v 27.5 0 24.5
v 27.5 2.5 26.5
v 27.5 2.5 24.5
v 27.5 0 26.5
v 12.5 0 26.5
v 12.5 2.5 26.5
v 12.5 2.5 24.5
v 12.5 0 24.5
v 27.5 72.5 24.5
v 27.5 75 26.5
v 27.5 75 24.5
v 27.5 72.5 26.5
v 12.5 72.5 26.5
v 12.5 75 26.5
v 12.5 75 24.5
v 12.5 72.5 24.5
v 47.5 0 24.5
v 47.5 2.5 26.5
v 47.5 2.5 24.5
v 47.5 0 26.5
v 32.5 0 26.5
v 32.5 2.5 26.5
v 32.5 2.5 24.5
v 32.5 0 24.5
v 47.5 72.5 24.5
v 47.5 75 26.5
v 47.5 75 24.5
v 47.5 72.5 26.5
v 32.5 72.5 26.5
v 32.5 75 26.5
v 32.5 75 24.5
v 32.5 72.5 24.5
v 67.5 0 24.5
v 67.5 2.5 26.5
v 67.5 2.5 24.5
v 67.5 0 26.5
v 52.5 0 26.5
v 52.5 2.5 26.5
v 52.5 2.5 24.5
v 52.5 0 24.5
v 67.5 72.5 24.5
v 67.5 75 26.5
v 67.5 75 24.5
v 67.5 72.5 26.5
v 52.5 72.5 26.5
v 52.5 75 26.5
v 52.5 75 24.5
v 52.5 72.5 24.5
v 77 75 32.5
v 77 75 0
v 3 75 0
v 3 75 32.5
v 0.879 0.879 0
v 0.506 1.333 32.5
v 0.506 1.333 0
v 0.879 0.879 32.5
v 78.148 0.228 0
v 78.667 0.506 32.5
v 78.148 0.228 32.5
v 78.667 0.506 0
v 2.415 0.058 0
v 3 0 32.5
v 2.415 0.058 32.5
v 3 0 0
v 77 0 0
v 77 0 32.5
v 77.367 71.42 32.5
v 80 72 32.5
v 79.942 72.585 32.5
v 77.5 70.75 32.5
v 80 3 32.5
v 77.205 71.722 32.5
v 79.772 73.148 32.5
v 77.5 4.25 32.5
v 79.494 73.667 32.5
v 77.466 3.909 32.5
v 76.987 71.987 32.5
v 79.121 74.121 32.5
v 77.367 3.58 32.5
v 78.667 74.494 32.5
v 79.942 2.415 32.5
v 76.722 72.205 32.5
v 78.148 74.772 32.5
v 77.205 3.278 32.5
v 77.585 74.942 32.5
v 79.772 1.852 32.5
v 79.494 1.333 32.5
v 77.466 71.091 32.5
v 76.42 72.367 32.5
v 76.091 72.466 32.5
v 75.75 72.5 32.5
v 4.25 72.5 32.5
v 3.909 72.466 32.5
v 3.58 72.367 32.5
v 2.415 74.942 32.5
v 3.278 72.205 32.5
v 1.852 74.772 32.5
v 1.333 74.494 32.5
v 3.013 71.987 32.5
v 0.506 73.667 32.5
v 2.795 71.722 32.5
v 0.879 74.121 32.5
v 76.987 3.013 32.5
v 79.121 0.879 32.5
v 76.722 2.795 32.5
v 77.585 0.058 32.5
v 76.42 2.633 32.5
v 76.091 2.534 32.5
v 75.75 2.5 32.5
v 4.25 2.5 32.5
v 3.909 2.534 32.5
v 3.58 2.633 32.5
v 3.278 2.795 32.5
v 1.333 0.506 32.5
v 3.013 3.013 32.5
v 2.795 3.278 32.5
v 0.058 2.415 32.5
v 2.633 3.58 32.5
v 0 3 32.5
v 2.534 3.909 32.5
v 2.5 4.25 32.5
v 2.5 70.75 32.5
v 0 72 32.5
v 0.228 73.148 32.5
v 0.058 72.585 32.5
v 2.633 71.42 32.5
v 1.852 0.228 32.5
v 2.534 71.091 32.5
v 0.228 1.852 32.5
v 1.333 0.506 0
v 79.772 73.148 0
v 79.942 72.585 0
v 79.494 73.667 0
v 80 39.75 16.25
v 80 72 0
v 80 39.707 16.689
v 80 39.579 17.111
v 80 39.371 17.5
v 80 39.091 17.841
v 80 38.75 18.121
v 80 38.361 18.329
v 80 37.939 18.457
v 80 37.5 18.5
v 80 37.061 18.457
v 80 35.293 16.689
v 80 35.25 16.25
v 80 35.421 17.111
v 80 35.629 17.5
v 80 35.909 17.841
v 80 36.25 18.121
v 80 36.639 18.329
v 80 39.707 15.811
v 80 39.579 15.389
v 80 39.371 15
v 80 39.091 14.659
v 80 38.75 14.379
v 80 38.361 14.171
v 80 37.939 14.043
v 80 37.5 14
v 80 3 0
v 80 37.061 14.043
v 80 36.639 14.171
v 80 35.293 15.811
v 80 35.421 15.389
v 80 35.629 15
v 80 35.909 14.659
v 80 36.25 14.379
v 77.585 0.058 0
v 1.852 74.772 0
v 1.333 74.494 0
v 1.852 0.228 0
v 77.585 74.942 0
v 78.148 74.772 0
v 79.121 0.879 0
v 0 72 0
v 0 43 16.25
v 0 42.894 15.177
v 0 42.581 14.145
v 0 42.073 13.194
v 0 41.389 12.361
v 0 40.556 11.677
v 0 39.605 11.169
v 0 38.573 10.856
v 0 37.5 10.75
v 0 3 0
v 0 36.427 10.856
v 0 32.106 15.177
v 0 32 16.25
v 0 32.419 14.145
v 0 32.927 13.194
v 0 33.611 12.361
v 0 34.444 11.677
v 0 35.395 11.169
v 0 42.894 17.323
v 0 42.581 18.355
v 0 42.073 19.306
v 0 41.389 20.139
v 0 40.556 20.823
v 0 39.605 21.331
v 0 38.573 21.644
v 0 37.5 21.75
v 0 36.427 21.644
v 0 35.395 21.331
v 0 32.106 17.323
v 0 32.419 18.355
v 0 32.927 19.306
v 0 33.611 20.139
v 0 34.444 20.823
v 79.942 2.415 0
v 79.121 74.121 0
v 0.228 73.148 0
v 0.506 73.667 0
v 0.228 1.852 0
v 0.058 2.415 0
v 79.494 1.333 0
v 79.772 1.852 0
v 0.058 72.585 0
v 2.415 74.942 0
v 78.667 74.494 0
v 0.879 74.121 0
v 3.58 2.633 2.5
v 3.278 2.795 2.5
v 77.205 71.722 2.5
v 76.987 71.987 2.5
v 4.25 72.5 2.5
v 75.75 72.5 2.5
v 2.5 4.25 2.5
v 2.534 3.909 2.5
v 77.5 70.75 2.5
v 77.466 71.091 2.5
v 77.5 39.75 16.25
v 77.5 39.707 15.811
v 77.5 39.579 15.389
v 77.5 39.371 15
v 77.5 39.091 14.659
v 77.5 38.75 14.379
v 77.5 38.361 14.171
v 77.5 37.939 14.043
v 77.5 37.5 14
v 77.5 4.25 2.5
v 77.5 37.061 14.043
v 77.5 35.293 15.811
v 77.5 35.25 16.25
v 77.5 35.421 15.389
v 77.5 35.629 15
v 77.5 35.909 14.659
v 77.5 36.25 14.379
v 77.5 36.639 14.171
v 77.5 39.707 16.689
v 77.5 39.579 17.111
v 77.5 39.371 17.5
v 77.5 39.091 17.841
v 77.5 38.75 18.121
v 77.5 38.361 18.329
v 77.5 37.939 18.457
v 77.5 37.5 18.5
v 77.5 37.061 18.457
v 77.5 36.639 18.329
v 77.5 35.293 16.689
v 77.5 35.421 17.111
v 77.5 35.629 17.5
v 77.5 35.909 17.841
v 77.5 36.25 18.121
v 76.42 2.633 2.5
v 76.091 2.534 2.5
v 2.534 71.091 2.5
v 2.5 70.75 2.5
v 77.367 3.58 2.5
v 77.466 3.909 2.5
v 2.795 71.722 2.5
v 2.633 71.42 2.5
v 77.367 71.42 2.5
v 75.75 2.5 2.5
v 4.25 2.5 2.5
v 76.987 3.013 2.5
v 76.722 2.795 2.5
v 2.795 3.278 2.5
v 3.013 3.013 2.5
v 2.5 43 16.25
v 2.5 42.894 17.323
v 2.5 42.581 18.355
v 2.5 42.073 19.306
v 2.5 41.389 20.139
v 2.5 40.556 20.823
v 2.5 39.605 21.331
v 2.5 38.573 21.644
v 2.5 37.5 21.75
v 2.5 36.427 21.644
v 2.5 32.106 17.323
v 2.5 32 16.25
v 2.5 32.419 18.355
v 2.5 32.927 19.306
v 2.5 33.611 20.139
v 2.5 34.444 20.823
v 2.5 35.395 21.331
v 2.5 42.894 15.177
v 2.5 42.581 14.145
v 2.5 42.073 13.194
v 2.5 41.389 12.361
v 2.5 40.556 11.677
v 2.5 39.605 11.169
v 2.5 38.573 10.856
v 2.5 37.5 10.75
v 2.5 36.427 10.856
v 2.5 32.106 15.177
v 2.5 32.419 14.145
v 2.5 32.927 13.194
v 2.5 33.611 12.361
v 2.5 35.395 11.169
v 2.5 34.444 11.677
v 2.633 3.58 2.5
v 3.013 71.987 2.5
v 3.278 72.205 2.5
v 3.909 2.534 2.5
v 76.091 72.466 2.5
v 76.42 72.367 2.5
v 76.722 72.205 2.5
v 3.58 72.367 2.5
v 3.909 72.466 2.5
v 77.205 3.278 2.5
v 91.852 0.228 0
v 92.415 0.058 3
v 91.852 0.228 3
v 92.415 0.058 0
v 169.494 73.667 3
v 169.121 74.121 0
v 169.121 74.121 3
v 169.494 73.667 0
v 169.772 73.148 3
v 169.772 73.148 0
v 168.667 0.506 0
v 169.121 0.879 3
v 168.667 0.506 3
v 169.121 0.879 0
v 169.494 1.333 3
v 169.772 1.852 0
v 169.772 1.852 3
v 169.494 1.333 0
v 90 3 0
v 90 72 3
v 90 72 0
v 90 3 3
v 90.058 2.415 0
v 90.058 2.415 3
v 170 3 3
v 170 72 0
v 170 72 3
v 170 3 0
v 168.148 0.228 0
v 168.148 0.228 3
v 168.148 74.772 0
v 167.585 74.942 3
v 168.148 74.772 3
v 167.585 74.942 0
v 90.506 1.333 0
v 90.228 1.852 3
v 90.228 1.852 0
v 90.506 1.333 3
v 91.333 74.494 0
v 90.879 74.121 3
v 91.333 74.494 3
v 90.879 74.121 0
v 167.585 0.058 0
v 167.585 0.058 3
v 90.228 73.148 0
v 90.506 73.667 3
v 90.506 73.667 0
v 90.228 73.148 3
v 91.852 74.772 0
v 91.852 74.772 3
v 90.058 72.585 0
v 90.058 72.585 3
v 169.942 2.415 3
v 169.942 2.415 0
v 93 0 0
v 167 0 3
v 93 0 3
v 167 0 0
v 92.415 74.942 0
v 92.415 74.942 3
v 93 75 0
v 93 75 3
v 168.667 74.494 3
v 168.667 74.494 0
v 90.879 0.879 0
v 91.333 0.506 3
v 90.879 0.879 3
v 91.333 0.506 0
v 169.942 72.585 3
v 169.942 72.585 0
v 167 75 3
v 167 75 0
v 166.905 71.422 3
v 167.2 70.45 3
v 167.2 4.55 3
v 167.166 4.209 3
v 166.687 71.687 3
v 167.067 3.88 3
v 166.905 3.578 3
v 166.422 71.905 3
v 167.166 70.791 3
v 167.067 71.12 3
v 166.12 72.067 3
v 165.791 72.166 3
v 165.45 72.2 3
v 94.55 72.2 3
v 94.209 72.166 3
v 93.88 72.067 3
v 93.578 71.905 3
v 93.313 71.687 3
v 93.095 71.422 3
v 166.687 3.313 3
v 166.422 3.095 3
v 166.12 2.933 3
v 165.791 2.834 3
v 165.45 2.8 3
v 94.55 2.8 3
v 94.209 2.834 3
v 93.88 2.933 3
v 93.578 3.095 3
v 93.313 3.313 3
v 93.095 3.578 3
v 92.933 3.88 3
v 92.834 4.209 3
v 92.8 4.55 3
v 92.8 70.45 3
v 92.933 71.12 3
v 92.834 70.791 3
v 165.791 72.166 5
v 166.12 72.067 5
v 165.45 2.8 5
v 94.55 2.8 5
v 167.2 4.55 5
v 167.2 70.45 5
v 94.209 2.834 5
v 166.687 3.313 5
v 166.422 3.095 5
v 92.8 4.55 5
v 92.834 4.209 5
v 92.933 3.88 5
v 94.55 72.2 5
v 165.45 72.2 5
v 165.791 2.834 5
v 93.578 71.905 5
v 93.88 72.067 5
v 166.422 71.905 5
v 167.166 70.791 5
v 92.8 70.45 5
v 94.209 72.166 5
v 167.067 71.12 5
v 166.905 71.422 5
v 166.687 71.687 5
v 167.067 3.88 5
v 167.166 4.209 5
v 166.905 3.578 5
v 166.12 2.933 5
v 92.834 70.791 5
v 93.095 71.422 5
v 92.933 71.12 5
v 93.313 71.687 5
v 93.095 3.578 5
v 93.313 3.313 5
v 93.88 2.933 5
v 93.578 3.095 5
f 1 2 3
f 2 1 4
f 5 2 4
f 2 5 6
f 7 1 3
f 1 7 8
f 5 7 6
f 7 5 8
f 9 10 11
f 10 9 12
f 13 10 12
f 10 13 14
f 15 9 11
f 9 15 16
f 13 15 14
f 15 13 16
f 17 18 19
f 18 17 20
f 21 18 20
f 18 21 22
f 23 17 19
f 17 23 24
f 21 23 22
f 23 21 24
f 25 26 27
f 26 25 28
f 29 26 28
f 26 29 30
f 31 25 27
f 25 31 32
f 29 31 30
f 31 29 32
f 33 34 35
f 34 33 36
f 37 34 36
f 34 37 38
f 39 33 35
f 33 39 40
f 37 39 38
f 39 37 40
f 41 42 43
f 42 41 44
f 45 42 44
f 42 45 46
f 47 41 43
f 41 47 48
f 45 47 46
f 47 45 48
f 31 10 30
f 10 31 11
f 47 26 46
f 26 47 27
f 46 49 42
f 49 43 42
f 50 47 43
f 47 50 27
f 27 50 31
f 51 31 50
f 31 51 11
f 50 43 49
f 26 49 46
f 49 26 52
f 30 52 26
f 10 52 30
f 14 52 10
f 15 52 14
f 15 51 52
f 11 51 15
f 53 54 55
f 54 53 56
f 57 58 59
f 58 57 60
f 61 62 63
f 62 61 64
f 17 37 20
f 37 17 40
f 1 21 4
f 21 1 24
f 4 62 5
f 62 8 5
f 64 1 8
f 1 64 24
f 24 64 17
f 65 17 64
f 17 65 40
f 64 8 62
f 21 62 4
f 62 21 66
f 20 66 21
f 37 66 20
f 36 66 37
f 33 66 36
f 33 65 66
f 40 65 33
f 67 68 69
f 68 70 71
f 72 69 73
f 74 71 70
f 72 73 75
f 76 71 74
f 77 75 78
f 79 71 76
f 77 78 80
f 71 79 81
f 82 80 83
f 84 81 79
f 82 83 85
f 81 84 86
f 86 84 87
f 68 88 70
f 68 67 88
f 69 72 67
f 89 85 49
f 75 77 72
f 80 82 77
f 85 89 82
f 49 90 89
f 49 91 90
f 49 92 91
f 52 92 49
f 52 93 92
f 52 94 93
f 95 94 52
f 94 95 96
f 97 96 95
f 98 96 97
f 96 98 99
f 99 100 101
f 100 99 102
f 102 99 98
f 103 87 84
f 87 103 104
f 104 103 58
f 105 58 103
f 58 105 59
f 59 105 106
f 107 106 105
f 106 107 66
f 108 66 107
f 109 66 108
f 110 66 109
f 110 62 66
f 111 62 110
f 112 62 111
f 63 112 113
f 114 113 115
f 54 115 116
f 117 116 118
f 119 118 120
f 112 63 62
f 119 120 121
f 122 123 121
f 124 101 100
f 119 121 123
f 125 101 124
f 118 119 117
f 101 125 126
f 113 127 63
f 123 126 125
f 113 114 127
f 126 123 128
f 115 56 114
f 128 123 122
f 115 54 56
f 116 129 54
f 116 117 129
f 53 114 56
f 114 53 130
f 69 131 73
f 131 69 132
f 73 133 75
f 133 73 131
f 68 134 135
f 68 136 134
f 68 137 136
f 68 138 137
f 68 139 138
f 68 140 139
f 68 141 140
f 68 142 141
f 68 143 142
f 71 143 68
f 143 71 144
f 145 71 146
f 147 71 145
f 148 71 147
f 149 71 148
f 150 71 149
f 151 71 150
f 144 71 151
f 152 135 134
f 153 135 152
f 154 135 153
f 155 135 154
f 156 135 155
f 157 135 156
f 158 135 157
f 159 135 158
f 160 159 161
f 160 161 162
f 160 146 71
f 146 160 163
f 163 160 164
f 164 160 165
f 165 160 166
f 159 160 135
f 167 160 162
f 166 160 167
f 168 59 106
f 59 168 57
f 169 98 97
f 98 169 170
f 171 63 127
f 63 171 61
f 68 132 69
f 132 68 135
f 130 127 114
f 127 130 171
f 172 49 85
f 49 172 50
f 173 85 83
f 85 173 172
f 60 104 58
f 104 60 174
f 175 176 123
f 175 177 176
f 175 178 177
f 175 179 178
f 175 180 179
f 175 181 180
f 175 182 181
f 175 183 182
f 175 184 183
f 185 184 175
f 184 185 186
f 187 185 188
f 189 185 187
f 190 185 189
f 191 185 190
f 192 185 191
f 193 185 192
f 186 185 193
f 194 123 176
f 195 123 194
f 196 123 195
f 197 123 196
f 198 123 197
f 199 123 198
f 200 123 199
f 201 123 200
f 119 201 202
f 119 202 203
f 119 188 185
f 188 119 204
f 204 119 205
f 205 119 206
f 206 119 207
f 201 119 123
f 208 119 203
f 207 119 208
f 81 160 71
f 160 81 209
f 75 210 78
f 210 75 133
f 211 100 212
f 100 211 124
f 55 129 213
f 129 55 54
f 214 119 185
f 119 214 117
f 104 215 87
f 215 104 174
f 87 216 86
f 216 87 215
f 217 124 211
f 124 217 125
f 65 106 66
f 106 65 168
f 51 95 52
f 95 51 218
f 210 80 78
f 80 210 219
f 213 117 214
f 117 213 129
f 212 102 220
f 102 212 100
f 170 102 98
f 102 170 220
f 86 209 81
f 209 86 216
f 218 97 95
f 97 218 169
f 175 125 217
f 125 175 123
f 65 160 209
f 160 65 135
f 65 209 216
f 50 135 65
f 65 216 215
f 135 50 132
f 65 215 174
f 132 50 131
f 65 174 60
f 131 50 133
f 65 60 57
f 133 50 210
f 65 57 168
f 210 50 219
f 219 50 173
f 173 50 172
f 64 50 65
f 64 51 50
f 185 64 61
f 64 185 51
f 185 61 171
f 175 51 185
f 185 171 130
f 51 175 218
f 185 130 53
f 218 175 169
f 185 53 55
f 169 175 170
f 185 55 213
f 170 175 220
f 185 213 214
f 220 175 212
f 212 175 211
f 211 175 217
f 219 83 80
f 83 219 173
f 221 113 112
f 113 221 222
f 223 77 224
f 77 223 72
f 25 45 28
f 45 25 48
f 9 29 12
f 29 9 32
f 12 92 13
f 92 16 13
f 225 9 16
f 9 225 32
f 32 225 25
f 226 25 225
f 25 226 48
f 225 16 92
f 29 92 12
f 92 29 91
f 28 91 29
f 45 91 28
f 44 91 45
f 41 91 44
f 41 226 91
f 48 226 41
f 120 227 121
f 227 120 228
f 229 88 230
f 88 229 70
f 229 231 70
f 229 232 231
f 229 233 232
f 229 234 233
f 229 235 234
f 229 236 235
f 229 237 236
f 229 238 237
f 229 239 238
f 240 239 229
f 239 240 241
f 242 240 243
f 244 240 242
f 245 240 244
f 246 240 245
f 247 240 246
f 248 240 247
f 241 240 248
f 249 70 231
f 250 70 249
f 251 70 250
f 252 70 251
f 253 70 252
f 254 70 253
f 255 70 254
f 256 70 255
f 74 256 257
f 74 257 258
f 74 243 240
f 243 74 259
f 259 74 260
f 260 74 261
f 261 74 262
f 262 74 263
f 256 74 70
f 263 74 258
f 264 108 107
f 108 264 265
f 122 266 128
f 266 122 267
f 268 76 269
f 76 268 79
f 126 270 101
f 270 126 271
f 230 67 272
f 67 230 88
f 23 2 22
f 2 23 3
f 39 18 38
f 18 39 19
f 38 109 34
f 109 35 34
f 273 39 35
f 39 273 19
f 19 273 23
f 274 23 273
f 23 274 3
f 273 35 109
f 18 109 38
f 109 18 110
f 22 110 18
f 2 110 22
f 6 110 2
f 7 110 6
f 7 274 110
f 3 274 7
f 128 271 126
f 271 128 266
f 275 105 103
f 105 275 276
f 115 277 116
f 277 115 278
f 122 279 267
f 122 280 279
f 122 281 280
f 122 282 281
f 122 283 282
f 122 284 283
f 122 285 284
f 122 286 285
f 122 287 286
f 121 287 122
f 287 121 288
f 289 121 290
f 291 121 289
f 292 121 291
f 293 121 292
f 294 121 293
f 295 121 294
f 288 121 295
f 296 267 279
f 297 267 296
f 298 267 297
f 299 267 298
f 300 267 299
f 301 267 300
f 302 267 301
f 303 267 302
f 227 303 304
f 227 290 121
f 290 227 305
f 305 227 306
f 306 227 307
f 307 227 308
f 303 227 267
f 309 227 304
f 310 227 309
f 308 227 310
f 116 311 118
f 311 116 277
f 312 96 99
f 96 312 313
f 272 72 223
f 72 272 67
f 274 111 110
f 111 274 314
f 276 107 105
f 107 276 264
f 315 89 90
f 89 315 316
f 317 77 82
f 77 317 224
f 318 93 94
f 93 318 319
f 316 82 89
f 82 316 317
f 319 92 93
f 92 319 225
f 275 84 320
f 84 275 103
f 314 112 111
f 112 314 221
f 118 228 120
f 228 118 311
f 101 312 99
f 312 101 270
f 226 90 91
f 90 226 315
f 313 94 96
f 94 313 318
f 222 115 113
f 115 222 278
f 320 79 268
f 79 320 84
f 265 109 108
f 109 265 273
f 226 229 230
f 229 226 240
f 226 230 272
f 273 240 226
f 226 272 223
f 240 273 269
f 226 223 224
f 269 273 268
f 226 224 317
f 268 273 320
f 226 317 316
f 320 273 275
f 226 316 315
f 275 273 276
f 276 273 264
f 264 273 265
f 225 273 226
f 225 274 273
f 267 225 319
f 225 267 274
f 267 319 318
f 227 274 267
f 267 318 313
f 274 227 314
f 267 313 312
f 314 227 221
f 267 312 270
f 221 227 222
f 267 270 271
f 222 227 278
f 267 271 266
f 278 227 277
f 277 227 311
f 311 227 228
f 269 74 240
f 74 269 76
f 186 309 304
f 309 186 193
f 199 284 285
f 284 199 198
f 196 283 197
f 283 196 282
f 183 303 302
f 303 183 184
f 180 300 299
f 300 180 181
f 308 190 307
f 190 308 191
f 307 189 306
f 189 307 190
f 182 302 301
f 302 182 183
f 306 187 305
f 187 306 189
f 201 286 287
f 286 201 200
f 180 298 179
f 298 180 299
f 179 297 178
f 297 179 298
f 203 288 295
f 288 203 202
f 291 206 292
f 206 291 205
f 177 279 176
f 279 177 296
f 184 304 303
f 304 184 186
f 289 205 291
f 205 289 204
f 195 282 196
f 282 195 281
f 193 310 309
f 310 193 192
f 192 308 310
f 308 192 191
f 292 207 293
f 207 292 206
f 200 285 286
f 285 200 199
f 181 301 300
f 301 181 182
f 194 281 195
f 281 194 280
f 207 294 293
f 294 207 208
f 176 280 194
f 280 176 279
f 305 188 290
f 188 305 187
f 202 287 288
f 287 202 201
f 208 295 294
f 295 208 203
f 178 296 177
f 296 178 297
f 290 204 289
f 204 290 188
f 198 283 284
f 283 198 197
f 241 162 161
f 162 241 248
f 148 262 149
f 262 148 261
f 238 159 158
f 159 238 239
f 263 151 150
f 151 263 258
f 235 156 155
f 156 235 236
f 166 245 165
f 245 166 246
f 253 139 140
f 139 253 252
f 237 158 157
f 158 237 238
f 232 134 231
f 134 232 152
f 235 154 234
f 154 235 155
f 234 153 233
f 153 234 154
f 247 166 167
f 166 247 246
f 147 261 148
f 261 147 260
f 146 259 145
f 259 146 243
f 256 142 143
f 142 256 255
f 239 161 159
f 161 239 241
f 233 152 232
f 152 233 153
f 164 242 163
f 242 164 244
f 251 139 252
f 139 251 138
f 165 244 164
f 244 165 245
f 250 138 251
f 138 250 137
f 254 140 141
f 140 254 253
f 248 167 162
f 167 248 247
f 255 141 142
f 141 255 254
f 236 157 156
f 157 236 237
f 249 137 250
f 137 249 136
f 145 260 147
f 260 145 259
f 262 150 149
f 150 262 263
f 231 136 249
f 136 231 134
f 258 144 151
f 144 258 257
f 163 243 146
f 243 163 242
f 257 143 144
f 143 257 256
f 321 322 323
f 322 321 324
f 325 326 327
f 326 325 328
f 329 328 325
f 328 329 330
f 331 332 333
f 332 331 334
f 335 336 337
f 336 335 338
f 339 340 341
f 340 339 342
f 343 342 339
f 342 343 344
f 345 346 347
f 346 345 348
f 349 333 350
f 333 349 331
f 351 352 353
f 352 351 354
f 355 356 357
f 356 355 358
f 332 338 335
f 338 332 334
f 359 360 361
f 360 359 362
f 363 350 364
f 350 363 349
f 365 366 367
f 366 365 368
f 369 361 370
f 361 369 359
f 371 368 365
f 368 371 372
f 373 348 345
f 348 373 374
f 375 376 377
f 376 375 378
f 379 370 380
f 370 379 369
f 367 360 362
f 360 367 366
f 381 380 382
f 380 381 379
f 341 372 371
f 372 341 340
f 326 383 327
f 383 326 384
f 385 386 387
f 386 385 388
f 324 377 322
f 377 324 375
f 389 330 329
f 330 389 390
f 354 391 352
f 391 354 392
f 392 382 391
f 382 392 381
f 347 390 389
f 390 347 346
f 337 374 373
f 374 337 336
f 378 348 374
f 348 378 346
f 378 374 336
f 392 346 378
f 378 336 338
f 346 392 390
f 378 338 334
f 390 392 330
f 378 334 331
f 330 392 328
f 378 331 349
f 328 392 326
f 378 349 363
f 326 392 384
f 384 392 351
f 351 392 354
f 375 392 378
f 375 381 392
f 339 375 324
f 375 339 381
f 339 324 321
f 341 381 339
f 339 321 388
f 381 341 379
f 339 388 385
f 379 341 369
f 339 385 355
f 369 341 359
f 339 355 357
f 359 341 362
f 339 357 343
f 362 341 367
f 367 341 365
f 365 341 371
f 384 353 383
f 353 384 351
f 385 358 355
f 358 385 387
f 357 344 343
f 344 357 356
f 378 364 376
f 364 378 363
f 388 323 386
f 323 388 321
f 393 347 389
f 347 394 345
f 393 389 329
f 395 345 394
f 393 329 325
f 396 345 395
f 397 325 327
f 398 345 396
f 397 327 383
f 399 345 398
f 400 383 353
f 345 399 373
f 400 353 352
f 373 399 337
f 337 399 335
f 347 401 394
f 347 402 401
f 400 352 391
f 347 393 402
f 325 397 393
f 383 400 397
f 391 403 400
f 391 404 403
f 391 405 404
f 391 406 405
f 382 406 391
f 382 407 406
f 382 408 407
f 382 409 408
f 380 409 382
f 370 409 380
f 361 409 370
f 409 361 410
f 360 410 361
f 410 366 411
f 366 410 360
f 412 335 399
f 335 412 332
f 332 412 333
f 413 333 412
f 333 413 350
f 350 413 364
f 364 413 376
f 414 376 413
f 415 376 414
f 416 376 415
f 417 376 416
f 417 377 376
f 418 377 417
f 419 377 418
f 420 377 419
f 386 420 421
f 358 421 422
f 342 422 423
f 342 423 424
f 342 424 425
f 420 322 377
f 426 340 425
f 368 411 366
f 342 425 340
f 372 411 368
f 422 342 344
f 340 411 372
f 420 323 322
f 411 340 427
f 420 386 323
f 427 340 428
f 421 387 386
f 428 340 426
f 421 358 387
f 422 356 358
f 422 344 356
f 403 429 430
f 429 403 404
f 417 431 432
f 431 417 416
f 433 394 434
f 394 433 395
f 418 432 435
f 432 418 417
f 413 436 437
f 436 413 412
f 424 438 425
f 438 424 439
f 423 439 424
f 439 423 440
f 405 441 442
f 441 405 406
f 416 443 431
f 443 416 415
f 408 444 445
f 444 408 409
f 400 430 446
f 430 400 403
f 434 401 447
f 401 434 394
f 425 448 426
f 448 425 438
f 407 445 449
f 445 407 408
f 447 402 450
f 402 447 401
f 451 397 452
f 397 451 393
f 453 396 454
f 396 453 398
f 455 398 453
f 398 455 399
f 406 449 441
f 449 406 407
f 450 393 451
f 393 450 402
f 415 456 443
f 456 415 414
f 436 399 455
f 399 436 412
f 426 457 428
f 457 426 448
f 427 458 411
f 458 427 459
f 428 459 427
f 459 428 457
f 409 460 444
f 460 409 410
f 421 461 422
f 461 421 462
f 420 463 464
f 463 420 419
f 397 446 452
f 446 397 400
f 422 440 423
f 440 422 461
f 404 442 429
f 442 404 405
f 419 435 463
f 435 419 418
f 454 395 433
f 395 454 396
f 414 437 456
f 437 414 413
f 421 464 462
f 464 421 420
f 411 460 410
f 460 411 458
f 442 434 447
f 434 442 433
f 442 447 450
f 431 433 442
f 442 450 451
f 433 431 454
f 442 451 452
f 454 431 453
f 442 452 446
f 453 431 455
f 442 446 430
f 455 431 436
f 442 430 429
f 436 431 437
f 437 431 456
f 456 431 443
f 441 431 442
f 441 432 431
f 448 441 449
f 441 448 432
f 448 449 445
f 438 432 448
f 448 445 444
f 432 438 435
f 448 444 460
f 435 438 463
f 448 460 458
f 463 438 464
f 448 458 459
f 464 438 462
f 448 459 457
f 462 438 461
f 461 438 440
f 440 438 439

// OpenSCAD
// ============================================================================
// PixelTree Controller Enclosure
// For: DC-DC Converter + ESP32 + Pixel Booster
// ============================================================================

// --- PARAMETERS (adjust if needed) ---
wall = 2.5;              // Wall thickness
tolerance = 0.3;         // Printer tolerance

// Internal dimensions (user specified)
inner_length = 75;       // 15mm socket + 58mm converter + 2mm margin
inner_width = 70;        // as specified
inner_height = 30;       // as specified

// Calculated outer dimensions
outer_length = inner_length + 2*wall;
outer_width = inner_width + 2*wall;
outer_height = inner_height + wall;  // bottom wall only

// Cable holes
dc_socket_hole = 11;     // DC 2.1/5.5 panel mount socket (M11 thread)
led_cable_hole = 4.5;    // 3x LED wires (1.4mm each) - minimal size

// PRINT COLOR: Black filament (PLA/PETG)

// Ventilation
vent_slot_width = 2;
vent_slot_length = 15;
vent_spacing = 5;

// Lid parameters
lid_lip = 2;             // Lip that goes inside box
lid_height = 5;          // Total lid height

// Corner radius
corner_r = 3;

// --- MODULES ---

module rounded_box(l, w, h, r) {
    hull() {
        for (x = [r, l-r]) {
            for (y = [r, w-r]) {
                translate([x, y, 0])
                    cylinder(h=h, r=r, $fn=32);
            }
        }
    }
}

module base() {
    difference() {
        // Outer shell
        rounded_box(outer_length, outer_width, outer_height, corner_r);
        
        // Inner cavity
        translate([wall, wall, wall])
            rounded_box(inner_length, inner_width, inner_height + 1, corner_r - wall/2);
        
        // DC socket hole - input side (24V DC in) - panel mount socket
        translate([-1, outer_width/2, outer_height/2])
            rotate([0, 90, 0])
                cylinder(d=dc_socket_hole, h=wall+2, $fn=32);
        
        // LED cable hole - output side (to LED strip - 3 wires)
        translate([outer_length - wall - 1, outer_width/2, outer_height/2])
            rotate([0, 90, 0])
                cylinder(d=led_cable_hole, h=wall+2, $fn=32);
        
        // Ventilation slots - symmetric on both long sides
        vent_count = 3;
        total_vents_width = vent_count * vent_slot_length + (vent_count - 1) * vent_spacing;
        vent_start_x = (outer_length - total_vents_width) / 2;
        
        for (i = [0:vent_count-1]) {
            // Front side vents
            translate([vent_start_x + i*(vent_slot_length + vent_spacing), -1, outer_height - 8])
                cube([vent_slot_length, wall+2, vent_slot_width]);
            // Back side vents
            translate([vent_start_x + i*(vent_slot_length + vent_spacing), outer_width - wall - 1, outer_height - 8])
                cube([vent_slot_length, wall+2, vent_slot_width]);
        }
    }
}

module lid() {
    // Simple friction-fit lid (use glue or welding for permanent attachment)
    union() {
        // Main lid
        rounded_box(outer_length, outer_width, lid_height - lid_lip, corner_r);
        
        // Inner lip that fits inside box
        translate([wall + tolerance, wall + tolerance, lid_height - lid_lip])
            rounded_box(inner_length - 2*tolerance, inner_width - 2*tolerance, lid_lip, corner_r - wall/2);
    }
}

// --- RENDER ---
// Uncomment what you want to render/export:

// Both parts side by side (for preview)
base();
translate([outer_length + 10, 0, 0])
    lid();

// Just base:
// base();

// Just lid:
// lid();

// Lid flipped for printing:
// translate([0, 0, lid_height]) rotate([180, 0, 0]) lid();
